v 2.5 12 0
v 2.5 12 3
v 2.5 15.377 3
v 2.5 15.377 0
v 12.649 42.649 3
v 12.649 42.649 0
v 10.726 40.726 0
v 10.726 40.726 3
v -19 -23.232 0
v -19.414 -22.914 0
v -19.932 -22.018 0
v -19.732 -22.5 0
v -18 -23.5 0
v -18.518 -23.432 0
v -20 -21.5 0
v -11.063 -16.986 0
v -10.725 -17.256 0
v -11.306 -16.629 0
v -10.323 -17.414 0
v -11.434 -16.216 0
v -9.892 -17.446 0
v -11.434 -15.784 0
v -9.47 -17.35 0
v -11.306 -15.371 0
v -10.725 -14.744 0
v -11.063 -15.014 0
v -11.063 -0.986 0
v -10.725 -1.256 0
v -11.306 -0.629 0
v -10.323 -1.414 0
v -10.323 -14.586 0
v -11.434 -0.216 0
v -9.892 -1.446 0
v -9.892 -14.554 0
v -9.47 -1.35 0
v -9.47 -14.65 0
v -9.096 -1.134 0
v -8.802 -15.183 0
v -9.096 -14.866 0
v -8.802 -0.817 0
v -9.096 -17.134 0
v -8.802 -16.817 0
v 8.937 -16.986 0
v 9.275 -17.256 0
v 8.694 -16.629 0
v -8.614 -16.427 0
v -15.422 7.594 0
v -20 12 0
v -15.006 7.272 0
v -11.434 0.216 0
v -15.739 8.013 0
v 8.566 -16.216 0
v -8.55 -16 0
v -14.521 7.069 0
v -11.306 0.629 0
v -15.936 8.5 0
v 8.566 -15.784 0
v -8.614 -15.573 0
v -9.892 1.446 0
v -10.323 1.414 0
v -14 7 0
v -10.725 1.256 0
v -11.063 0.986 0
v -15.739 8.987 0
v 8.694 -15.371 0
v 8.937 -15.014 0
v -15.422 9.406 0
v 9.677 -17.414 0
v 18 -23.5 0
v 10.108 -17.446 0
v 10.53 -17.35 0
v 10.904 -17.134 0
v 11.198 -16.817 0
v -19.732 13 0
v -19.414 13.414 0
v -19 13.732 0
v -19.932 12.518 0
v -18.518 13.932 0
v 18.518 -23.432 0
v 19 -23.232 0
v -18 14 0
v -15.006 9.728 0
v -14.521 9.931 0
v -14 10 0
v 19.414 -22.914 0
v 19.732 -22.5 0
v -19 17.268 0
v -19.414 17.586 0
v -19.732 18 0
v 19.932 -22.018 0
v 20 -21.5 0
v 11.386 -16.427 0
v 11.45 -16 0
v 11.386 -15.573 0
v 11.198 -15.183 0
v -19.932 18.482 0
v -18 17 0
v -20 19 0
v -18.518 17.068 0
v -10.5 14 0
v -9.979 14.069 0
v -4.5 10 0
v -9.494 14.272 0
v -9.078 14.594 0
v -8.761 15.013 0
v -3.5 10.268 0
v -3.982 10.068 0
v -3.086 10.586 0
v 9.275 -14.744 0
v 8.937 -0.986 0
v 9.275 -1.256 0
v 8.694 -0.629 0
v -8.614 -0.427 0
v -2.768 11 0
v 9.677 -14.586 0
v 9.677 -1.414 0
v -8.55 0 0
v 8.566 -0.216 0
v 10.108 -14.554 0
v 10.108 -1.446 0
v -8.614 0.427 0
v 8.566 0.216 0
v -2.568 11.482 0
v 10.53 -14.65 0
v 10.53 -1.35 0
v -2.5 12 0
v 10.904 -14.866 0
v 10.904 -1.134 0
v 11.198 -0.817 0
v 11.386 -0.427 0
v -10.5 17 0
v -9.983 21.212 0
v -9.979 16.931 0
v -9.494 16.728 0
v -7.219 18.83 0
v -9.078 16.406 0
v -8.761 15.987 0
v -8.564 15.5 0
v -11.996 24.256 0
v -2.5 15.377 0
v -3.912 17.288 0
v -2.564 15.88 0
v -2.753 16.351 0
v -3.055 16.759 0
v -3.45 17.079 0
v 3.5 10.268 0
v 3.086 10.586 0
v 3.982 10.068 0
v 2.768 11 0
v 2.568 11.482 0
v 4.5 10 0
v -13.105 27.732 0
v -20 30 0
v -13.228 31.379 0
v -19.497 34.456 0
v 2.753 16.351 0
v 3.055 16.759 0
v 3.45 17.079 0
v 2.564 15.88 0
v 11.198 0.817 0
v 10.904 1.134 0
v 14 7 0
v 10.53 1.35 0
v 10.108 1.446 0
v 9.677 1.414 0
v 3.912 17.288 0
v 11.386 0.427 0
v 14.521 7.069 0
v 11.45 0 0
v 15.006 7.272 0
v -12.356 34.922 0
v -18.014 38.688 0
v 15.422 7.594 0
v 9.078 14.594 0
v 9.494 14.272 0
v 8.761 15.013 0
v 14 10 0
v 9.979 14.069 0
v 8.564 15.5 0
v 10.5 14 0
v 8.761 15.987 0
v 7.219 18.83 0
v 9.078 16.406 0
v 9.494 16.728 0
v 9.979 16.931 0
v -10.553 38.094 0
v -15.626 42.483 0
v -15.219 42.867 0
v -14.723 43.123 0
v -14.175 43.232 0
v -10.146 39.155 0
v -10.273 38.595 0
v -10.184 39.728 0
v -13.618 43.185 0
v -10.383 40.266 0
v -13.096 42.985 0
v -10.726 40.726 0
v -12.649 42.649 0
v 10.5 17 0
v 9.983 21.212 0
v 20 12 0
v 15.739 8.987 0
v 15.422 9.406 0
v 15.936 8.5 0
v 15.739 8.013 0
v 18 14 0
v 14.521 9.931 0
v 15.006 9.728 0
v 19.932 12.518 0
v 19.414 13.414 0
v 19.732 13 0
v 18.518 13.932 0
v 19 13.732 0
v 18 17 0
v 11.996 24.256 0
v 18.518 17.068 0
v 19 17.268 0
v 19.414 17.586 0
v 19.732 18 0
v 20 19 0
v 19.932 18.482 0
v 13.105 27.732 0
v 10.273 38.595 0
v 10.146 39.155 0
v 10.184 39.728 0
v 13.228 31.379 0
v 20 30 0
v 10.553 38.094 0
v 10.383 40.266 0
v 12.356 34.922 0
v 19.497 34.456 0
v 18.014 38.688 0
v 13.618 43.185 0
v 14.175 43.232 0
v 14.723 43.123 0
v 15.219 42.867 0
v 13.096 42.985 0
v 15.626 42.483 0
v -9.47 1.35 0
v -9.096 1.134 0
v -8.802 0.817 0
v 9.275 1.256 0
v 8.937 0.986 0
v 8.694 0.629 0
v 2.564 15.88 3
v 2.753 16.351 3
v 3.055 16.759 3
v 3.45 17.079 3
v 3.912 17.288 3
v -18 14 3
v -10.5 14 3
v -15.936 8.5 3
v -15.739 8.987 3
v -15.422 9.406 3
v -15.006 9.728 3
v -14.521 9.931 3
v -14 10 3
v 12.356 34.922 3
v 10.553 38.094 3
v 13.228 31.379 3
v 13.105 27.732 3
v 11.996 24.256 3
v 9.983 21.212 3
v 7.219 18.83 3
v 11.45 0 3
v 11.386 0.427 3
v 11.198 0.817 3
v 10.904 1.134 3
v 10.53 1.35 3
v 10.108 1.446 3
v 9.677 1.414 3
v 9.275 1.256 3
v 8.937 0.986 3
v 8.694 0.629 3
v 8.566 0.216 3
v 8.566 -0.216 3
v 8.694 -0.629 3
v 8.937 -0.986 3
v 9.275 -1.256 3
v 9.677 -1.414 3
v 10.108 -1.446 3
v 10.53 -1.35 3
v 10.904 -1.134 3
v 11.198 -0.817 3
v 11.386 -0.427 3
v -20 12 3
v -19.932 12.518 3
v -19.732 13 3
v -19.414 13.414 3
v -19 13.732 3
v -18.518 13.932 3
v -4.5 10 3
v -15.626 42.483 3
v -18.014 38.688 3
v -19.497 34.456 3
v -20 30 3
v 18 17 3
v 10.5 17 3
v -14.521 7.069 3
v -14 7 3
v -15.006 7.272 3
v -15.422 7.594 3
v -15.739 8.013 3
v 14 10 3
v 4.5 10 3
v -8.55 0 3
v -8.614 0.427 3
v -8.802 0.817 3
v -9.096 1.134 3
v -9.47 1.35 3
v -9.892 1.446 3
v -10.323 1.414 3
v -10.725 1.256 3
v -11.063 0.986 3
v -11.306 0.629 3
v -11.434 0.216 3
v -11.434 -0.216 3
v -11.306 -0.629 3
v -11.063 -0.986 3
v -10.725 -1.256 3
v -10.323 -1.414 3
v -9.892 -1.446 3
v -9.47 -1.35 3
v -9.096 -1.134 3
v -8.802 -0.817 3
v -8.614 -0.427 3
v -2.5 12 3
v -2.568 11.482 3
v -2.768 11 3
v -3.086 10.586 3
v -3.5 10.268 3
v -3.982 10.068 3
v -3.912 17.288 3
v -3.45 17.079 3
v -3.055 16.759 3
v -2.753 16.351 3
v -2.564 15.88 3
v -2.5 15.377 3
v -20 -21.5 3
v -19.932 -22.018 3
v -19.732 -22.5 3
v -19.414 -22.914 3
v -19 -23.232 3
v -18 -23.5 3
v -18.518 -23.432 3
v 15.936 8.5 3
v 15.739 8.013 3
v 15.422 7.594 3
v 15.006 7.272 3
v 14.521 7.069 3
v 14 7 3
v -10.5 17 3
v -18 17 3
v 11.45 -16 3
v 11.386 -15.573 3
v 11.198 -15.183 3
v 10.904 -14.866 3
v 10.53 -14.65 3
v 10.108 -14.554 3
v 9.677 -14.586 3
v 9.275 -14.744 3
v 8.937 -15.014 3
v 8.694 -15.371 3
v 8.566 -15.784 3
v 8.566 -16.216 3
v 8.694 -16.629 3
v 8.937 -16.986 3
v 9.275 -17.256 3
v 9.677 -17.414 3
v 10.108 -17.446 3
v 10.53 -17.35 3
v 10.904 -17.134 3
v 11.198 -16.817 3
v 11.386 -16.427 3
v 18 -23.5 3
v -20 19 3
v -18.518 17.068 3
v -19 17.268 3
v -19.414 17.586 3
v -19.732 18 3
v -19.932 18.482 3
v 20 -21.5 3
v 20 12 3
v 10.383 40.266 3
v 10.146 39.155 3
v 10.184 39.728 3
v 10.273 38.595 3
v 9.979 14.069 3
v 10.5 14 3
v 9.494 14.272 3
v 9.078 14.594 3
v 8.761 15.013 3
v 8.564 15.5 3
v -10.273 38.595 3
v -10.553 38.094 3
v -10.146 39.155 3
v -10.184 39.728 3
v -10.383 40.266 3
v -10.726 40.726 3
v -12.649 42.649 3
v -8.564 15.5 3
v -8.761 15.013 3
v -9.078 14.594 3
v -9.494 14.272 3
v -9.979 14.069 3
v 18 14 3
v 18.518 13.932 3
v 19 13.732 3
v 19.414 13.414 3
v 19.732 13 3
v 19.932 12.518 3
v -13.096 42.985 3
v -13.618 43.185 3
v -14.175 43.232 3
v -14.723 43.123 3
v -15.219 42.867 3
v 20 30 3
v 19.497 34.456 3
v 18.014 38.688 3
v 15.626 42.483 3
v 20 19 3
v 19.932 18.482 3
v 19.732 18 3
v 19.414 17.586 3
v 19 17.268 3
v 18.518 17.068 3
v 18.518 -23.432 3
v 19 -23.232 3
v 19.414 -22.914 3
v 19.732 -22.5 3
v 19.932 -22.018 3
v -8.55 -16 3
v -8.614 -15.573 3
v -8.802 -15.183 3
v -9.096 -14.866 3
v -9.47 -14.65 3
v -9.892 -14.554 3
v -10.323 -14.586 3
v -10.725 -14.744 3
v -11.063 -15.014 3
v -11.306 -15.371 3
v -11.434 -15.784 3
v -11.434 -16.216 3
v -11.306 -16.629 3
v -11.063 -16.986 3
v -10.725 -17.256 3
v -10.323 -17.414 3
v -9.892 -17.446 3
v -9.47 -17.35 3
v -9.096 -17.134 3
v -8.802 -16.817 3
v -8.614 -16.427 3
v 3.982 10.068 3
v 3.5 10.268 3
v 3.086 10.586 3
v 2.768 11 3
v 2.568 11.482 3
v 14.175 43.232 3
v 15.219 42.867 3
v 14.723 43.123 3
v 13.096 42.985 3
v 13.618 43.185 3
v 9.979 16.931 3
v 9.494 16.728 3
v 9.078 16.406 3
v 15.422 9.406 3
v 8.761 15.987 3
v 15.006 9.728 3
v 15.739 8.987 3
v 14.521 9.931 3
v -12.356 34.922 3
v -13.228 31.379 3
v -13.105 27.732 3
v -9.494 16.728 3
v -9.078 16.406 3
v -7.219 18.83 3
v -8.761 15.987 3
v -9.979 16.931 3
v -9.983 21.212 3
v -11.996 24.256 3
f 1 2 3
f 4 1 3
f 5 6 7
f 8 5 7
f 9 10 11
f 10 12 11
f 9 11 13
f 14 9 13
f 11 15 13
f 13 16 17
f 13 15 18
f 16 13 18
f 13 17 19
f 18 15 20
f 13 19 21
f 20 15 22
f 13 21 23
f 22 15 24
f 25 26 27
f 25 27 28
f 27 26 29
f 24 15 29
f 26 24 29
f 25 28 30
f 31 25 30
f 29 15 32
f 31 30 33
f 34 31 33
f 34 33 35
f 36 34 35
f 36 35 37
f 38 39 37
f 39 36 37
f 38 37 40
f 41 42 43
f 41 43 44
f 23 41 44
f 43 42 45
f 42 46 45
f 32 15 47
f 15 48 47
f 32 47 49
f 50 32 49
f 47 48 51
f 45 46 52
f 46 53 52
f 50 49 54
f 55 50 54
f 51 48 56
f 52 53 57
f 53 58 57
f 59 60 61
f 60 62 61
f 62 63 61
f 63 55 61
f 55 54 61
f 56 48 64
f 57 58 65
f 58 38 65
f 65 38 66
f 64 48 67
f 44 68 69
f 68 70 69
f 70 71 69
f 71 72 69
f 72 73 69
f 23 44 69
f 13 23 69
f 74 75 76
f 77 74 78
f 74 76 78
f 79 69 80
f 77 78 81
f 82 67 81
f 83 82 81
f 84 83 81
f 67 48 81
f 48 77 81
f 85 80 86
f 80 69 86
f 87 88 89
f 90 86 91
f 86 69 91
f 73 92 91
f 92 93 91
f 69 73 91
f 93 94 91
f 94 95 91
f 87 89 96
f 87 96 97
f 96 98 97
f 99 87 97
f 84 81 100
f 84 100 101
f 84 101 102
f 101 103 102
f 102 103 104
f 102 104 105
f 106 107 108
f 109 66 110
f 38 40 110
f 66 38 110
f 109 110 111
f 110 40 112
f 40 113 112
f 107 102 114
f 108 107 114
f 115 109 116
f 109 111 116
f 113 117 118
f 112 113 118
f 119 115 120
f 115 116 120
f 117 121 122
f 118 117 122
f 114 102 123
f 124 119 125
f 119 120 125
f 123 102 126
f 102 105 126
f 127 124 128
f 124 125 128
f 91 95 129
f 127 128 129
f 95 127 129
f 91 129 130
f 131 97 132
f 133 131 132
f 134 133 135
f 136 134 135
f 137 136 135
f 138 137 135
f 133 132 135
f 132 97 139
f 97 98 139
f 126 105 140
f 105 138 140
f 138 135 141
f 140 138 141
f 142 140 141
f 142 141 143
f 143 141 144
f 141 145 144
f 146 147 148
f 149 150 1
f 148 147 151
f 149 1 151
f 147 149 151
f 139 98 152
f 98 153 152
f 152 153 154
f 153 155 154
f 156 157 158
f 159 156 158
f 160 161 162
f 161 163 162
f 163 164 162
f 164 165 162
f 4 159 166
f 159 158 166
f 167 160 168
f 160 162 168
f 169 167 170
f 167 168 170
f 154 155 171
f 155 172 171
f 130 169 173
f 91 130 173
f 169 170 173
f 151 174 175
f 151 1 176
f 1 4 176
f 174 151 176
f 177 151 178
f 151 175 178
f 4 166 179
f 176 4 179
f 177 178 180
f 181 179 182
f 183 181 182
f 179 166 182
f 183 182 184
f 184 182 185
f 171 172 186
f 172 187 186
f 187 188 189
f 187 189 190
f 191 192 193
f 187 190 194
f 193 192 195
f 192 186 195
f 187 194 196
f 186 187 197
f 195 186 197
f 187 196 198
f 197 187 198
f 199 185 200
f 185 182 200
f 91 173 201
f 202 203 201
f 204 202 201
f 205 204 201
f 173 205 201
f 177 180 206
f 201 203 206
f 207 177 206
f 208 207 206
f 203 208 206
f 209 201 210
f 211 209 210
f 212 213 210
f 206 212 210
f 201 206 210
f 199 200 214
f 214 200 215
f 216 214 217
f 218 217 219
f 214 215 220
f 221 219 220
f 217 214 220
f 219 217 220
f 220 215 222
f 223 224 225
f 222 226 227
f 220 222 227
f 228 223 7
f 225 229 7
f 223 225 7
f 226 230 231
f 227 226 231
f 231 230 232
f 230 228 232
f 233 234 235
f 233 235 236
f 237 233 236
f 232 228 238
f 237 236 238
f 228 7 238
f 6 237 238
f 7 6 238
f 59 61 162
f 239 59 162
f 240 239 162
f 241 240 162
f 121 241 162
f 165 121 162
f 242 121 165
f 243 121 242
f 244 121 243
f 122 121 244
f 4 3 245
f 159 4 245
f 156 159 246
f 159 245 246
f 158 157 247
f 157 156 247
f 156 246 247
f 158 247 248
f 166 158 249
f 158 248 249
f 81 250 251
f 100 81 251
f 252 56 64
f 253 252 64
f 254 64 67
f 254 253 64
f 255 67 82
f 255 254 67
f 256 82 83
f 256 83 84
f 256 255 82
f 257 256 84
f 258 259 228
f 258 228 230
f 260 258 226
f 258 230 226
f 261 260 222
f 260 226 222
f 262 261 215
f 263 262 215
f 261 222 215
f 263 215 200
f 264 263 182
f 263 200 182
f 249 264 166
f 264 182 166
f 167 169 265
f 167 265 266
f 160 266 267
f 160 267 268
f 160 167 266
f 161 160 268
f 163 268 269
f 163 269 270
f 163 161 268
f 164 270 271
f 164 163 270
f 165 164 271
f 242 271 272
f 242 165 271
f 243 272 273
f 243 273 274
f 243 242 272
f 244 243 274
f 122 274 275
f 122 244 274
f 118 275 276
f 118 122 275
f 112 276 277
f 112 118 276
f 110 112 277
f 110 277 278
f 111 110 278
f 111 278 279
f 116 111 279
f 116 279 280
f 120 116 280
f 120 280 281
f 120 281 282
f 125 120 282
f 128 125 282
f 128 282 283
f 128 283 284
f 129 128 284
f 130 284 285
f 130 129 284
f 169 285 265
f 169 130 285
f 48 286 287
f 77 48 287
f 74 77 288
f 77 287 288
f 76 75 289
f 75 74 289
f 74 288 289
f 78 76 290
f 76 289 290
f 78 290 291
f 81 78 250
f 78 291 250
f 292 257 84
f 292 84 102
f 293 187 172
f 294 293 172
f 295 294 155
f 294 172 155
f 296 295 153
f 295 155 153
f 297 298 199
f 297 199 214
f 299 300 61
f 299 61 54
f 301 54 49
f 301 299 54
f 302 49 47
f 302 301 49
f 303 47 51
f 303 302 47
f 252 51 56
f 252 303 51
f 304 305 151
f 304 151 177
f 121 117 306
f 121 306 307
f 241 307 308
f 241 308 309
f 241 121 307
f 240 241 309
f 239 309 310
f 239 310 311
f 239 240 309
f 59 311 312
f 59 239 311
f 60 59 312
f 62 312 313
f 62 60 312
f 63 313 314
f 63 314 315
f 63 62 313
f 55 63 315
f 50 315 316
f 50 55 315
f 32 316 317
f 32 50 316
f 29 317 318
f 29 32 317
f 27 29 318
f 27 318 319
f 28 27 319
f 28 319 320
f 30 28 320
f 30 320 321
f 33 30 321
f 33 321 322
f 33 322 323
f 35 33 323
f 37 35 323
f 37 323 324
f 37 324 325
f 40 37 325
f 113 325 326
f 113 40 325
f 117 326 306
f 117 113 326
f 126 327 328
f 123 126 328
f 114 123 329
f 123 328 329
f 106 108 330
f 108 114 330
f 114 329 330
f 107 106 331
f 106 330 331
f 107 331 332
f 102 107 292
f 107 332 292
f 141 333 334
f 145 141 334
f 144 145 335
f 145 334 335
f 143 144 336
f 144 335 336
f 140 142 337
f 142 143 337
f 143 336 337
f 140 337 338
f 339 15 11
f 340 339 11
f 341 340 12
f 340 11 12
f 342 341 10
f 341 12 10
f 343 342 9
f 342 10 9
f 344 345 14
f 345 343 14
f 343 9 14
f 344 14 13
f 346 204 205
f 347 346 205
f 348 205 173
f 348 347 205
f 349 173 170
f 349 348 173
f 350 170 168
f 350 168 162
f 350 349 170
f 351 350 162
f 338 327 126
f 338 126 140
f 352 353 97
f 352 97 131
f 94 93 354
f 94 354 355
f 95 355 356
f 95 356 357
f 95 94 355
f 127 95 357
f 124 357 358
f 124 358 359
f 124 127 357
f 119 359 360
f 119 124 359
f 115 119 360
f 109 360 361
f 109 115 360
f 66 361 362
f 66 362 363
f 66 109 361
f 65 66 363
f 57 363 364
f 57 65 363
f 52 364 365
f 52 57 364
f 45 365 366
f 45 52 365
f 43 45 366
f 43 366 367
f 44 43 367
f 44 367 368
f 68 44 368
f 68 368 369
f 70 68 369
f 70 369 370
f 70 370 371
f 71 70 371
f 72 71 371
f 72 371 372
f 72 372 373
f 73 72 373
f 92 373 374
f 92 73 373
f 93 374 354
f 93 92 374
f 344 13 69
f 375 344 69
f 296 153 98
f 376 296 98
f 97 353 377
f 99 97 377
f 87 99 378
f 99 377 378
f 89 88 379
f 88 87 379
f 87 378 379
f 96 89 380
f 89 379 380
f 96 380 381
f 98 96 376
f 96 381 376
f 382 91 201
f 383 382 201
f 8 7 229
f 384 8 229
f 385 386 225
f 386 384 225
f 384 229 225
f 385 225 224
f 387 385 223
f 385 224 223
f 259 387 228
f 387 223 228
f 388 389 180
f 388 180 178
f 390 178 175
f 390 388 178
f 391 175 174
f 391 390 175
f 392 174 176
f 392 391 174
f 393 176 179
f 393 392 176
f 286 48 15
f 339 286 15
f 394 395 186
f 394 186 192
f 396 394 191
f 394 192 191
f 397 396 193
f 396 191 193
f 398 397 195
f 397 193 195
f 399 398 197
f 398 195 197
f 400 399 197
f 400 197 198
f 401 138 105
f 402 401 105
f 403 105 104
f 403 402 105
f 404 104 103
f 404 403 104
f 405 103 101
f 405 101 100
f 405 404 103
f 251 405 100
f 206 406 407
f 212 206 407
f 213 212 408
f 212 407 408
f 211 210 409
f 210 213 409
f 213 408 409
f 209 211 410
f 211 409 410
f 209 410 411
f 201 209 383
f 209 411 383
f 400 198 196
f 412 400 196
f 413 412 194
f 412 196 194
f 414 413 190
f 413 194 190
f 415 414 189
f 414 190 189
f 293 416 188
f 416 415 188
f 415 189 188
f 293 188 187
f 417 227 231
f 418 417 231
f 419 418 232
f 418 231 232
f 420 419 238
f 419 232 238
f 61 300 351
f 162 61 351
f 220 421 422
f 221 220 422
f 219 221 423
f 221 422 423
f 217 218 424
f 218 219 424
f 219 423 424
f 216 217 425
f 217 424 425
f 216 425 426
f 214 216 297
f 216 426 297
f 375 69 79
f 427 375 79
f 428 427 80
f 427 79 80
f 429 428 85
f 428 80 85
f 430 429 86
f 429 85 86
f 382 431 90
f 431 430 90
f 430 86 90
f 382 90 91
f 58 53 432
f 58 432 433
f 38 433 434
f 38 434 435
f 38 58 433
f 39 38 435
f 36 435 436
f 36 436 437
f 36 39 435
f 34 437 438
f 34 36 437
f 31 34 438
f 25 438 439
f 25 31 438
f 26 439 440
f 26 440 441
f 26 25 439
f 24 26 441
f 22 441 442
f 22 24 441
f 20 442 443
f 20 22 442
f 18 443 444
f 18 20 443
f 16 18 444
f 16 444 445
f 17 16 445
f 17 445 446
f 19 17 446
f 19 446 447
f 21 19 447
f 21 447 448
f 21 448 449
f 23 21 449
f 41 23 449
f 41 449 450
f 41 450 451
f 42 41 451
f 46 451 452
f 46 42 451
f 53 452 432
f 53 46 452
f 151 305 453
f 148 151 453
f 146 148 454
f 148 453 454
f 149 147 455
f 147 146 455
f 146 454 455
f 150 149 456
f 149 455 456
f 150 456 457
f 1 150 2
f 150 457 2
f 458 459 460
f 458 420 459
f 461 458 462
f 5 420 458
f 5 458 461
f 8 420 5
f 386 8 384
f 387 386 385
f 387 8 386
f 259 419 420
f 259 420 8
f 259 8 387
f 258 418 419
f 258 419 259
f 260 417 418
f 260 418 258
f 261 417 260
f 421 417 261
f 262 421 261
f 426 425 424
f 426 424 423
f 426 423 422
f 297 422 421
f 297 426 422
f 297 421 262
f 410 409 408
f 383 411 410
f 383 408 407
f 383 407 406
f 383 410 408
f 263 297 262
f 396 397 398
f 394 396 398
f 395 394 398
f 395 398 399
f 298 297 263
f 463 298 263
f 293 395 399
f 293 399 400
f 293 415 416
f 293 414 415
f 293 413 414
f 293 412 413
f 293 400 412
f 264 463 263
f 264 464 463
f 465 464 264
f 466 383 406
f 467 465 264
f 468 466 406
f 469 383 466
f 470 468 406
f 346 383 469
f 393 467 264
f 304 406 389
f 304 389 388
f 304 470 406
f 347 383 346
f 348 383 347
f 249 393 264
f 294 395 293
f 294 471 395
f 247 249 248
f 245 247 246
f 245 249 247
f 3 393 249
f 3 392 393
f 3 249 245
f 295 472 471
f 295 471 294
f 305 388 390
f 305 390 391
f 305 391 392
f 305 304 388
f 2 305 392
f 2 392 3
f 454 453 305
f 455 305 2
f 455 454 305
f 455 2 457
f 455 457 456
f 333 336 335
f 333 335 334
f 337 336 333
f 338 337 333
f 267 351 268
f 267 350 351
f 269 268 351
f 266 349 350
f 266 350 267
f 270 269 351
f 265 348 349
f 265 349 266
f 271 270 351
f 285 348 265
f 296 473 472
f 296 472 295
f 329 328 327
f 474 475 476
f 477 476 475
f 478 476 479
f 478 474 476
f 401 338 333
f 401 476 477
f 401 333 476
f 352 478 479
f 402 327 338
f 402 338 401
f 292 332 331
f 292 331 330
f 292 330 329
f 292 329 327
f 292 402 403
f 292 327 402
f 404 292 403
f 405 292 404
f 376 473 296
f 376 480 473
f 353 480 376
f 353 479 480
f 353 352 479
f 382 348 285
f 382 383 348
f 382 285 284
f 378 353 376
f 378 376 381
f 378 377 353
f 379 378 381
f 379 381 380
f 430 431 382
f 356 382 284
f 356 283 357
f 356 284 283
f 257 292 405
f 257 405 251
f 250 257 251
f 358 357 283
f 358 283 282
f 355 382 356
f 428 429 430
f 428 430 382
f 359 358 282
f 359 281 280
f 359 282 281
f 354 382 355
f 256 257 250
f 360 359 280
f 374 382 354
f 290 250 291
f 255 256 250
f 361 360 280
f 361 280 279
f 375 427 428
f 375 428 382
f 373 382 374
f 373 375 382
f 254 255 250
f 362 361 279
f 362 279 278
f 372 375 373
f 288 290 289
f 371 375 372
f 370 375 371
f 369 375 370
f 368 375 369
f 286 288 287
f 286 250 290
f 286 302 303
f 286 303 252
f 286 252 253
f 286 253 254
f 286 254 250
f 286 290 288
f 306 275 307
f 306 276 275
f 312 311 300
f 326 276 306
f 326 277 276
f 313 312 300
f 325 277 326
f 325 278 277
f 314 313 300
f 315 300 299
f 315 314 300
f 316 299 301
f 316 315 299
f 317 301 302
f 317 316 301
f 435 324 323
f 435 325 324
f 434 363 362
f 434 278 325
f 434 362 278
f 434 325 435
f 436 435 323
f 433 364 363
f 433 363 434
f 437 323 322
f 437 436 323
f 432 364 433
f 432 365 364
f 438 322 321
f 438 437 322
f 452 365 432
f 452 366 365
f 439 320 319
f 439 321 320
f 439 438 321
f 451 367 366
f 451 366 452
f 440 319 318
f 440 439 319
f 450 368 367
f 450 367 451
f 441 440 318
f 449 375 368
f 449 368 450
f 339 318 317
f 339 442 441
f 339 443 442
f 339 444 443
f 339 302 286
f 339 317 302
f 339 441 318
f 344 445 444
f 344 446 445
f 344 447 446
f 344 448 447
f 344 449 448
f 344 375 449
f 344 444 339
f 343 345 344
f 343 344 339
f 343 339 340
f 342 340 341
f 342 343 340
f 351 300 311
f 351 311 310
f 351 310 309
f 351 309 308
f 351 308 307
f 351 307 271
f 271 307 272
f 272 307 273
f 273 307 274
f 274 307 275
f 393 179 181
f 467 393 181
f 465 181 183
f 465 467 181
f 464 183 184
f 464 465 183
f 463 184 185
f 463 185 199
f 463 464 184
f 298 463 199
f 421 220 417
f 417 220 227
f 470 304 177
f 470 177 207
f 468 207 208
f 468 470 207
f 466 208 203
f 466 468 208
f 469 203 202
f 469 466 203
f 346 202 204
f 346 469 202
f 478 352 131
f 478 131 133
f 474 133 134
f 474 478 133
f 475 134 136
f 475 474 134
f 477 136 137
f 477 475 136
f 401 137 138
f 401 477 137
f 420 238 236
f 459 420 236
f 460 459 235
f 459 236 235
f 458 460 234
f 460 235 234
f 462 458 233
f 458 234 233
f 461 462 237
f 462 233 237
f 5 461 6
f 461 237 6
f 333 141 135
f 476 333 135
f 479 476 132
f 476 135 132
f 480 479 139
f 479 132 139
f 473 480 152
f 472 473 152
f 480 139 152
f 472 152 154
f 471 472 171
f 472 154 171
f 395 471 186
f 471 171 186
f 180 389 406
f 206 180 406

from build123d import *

# Parameters (mm, degrees)
SKETCH_1_R          = 1.45
EXTRUDE_1_DEPTH     = 3
SKETCH_2_W          = 5
SKETCH_2_H          = 25
CUT_EXTRUDE_1_DEPTH = 49.554383298
SKETCH_3_W          = 11.5
SKETCH_3_H          = 3
SKETCH_3_W_2        = 13.5
CUT_EXTRUDE_2_DEPTH = 49.554383298
FILLET_1_R          = 2


with BuildPart() as part:
    # 草图1 → 凸台-拉伸1 (new body)
    with BuildSketch(Plane.XY):
        with BuildLine():
            Line((-9.40452019, 39.40452019), (-14.142135624, 44.142135624))
            ThreePointArc((-14.142135624, 44.142135624), (-18.47759065, 37.653668647), (-20, 30))
            Line((-20, 30), (-20, -23.5))
            Line((-20, -23.5), (20, -23.5))
            Line((20, -23.5), (20, 30))
            ThreePointArc((20, 30), (18.47759065, 37.653668647), (14.142135624, 44.142135624))
            Line((14.142135624, 44.142135624), (9.40452019, 39.40452019))
            ThreePointArc((9.40452019, 39.40452019), (0, 16.7), (-9.40452019, 39.40452019))
        make_face()
        with Locations((-10, 0)):
            Circle(SKETCH_1_R, mode=Mode.SUBTRACT)
        with Locations((10, 0)):
            Circle(SKETCH_1_R, mode=Mode.SUBTRACT)
        with Locations((-10, -16)):
            Circle(SKETCH_1_R, mode=Mode.SUBTRACT)
        with Locations((10, -16)):
            Circle(SKETCH_1_R, mode=Mode.SUBTRACT)
    extrude(amount=EXTRUDE_1_DEPTH)

    # 草图2 → 切除-拉伸1 (cut, through all)
    with BuildSketch(Plane.XY.offset(3)):
        with Locations((0, 19.5)):
            Rectangle(SKETCH_2_W, SKETCH_2_H)
    extrude(amount=-CUT_EXTRUDE_1_DEPTH, mode=Mode.SUBTRACT)

    # 草图3 → 切除-拉伸2 (cut, through all)
    with BuildSketch(Plane.XY.offset(3)):
        with Locations((-14.25, 15.5)):
            Rectangle(SKETCH_3_W, SKETCH_3_H)
        with Locations((-9.25, 8.5)):
            Rectangle(SKETCH_3_W_2, SKETCH_3_H)
        with Locations((9.25, 8.5)):
            Rectangle(SKETCH_3_W_2, SKETCH_3_H)
        with Locations((14.25, 15.5)):
            Rectangle(SKETCH_3_W, SKETCH_3_H)
    extrude(amount=-CUT_EXTRUDE_2_DEPTH, mode=Mode.SUBTRACT)

    # 圆角1
    # the kernel refuses this fillet: 2 mm, written as the material it adds along each edge
    with BuildSketch(Plane(origin=(8.5, 17, 3), x_dir=(1, 0, 0), z_dir=(0, 0, -1)), Plane(origin=(8.5, 14, 3), x_dir=(0, 1, 0), z_dir=(0, 0, -1)), Plane(origin=(-8.5, 14, 3), x_dir=(-1, 0, 0), z_dir=(0, 0, -1)), Plane(origin=(-8.5, 17, 3), x_dir=(0, -1, 0), z_dir=(0, 0, -1)), Plane(origin=(-16, 10, 3), x_dir=(1, 0, 0), z_dir=(0, 0, -1)), Plane(origin=(-16, 7, 3), x_dir=(0, 1, 0), z_dir=(0, 0, -1)), Plane(origin=(16, 7, 3), x_dir=(-1, 0, 0), z_dir=(0, 0, -1)), Plane(origin=(16, 10, 3), x_dir=(0, -1, 0), z_dir=(0, 0, -1))) as fillet_1_piece_1:
        with BuildLine():
            CenterArc((FILLET_1_R, FILLET_1_R), FILLET_1_R, 180, 90)
            Line((0, FILLET_1_R), (0, 0))
            Line((0, 0), (FILLET_1_R, 0))
        make_face()
    extrude(amount=3)
    # the kernel refuses this fillet: 2 mm, written as the material it takes off along each edge
    with BuildSketch(Plane(origin=(20, 14, 8), x_dir=(0, -1, 0), z_dir=(0, 0, -1)), Plane(origin=(-20, 14, 8), x_dir=(1, 0, 0), z_dir=(0, 0, -1)), Plane(origin=(-20, 17, 8), x_dir=(0, 1, 0), z_dir=(0, 0, -1)), Plane(origin=(-2.5, 10, 8), x_dir=(-1, 0, 0), z_dir=(0, 0, -1)), Plane(origin=(2.5, 10, 8), x_dir=(0, 1, 0), z_dir=(0, 0, -1)), Plane(origin=(20, 17, 8), x_dir=(-1, 0, 0), z_dir=(0, 0, -1))) as fillet_1_2_piece_1:
        with BuildLine():
            CenterArc((FILLET_1_R, FILLET_1_R), FILLET_1_R, 180, 90)
            Line((0, FILLET_1_R), (0, 0))
            Line((0, 0), (FILLET_1_R, 0))
        make_face()
    extrude(amount=13, mode=Mode.SUBTRACT)
    with BuildSketch(Plane(origin=(20, -23.5, -5), x_dir=(-1, 0, 0), z_dir=(0, 0, 1)), Plane(origin=(-20, -23.5, -5), x_dir=(0, 1, 0), z_dir=(0, 0, 1))) as fillet_1_2_piece_2:
        with BuildLine():
            CenterArc((FILLET_1_R, -FILLET_1_R), FILLET_1_R, 90, 90)
            Line((0, -FILLET_1_R), (0, 0))
            Line((0, 0), (FILLET_1_R, 0))
        make_face()
    extrude(amount=13, mode=Mode.SUBTRACT)
    with BuildSketch(Plane(origin=(-14.142135624, 44.142135624, -5.56417559), x_dir=(0.7071067811865518, -0.7071067811865434, 0), z_dir=(0, 0, 1))) as fillet_1_2_piece_3:
        with BuildLine():
            CenterArc((2.11145618, -2), FILLET_1_R, 90, 96.379370208)
            ThreePointArc((0.1238402, -2.222222222), (0.03098405, -1.112835118), (0, 0))
            Line((0, 0), (2.11145618, 0))
        make_face()
    extrude(amount=14.128351181, mode=Mode.SUBTRACT)
    with BuildSketch(Plane(origin=(-2.5, 16.937075366, 6.900861235), x_dir=(0, -1, 0), z_dir=(0, 0, -1))) as fillet_1_2_piece_4:
        with BuildLine():
            CenterArc((1.560344494, 2), FILLET_1_R, 197.104635177, 72.895364823)
            ThreePointArc((-0.351193954, 1.411764706), (-0.156279677, 0.71068777), (0, 0))
            Line((0, 0), (1.560344494, 0))
        make_face()
    extrude(amount=10.80172247, mode=Mode.SUBTRACT)
    with BuildSketch(Plane(origin=(2.5, 16.937075366, 6.900861235), x_dir=(0.9704244328417233, 0.2414050955216561, 0), z_dir=(0, 0, -1))) as fillet_1_2_piece_5:
        with BuildLine():
            CenterArc((1.564173754, 1.997006612), FILLET_1_R, 193.969485078, 72.895364823)
            Line((-0.376675112, 1.514196421), (0, 0))
            ThreePointArc((0, 0), (0.727395487, 0.019906032), (1.454790974, 0))
        make_face()
    extrude(amount=10.80172247, mode=Mode.SUBTRACT)
    with BuildSketch(Plane(origin=(9.40452019, 39.40452019, -4.671794525), x_dir=(0.6592727226844873, -0.7519039015221182, 0), z_dir=(0, 0, 1))) as fillet_1_2_piece_6:
        with BuildLine():
            CenterArc((1.873303853, 1.995705121), FILLET_1_R, 183.755569948, 82.488860105)
            Line((-0.122401268, 1.864704851), (0, 0))
            ThreePointArc((0, 0), (0.871151792, 0.028560946), (1.742303583, 0))
        make_face()
    extrude(amount=12.34358905, mode=Mode.SUBTRACT)
    with BuildSketch(Plane(origin=(14.142135624, 44.142135624, -5.56417559), x_dir=(-0.7071067811865467, -0.7071067811865483, 0), z_dir=(0, 0, 1))) as fillet_1_2_piece_7:
        with BuildLine():
            CenterArc((2.11145618, 2), FILLET_1_R, 173.620629792, 96.379370208)
            ThreePointArc((0.1238402, 2.222222222), (0.03098405, 1.112835118), (0, 0))
            Line((0, 0), (2.11145618, 0))
        make_face()
    extrude(amount=14.128351181, mode=Mode.SUBTRACT)
    with BuildSketch(Plane(origin=(-9.40452019, 39.40452019, -4.671794525), x_dir=(-0.659272722684483, -0.7519039015221219, 0), z_dir=(0, 0, 1))) as fillet_1_2_piece_8:
        with BuildLine():
            CenterArc((1.873303853, -1.995705121), FILLET_1_R, 93.755569948, 82.488860105)
            Line((-0.122401268, -1.864704851), (0, 0))
            ThreePointArc((0, 0), (0.871151792, -0.028560946), (1.742303583, 0))
        make_face()
    extrude(amount=12.34358905, mode=Mode.SUBTRACT)


solid = part.part
